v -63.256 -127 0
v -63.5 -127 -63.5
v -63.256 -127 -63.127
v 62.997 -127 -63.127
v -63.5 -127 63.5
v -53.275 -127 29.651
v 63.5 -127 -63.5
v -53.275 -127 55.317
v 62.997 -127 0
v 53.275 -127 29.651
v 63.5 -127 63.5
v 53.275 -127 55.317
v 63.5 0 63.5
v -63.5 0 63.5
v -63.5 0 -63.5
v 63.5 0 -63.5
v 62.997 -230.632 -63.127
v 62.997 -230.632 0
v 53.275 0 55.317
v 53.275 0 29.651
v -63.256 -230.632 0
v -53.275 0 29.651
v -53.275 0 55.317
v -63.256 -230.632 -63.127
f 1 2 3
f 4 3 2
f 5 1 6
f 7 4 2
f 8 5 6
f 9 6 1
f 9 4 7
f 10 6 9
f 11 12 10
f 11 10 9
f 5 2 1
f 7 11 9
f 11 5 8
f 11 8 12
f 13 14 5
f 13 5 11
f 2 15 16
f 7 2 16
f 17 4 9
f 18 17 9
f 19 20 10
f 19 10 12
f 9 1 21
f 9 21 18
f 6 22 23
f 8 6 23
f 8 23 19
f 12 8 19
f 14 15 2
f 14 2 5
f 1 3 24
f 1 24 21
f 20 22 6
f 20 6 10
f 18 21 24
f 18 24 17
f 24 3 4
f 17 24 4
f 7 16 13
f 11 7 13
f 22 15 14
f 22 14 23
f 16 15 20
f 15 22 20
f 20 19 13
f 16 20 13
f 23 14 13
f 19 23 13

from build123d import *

# Parameters (mm, degrees)
F0_W     = 127
F0_H     = 127
F0_W_2   = 106.550378
F0_H_2   = 25.665418
F1_DEPTH = 127
F2_W     = 126.253121
F2_H     = 63.126564
F3_DEPTH = 230.632


with BuildPart() as f1:
    # F0 (on Front) → F1 (new body)
    with BuildSketch(Plane.XZ):
        Rectangle(F0_W, F0_H)
        with Locations((0, 42.484045)):
            Rectangle(F0_W_2, F0_H_2, mode=Mode.SUBTRACT)
    extrude(amount=F1_DEPTH)

    # F2 (on Front) → F3 (join)
    with BuildSketch(Plane.XZ):
        with Locations((-0.129621, -31.563282)):
            Rectangle(F2_W, F2_H)
    extrude(amount=F3_DEPTH)


solid = f1.part
